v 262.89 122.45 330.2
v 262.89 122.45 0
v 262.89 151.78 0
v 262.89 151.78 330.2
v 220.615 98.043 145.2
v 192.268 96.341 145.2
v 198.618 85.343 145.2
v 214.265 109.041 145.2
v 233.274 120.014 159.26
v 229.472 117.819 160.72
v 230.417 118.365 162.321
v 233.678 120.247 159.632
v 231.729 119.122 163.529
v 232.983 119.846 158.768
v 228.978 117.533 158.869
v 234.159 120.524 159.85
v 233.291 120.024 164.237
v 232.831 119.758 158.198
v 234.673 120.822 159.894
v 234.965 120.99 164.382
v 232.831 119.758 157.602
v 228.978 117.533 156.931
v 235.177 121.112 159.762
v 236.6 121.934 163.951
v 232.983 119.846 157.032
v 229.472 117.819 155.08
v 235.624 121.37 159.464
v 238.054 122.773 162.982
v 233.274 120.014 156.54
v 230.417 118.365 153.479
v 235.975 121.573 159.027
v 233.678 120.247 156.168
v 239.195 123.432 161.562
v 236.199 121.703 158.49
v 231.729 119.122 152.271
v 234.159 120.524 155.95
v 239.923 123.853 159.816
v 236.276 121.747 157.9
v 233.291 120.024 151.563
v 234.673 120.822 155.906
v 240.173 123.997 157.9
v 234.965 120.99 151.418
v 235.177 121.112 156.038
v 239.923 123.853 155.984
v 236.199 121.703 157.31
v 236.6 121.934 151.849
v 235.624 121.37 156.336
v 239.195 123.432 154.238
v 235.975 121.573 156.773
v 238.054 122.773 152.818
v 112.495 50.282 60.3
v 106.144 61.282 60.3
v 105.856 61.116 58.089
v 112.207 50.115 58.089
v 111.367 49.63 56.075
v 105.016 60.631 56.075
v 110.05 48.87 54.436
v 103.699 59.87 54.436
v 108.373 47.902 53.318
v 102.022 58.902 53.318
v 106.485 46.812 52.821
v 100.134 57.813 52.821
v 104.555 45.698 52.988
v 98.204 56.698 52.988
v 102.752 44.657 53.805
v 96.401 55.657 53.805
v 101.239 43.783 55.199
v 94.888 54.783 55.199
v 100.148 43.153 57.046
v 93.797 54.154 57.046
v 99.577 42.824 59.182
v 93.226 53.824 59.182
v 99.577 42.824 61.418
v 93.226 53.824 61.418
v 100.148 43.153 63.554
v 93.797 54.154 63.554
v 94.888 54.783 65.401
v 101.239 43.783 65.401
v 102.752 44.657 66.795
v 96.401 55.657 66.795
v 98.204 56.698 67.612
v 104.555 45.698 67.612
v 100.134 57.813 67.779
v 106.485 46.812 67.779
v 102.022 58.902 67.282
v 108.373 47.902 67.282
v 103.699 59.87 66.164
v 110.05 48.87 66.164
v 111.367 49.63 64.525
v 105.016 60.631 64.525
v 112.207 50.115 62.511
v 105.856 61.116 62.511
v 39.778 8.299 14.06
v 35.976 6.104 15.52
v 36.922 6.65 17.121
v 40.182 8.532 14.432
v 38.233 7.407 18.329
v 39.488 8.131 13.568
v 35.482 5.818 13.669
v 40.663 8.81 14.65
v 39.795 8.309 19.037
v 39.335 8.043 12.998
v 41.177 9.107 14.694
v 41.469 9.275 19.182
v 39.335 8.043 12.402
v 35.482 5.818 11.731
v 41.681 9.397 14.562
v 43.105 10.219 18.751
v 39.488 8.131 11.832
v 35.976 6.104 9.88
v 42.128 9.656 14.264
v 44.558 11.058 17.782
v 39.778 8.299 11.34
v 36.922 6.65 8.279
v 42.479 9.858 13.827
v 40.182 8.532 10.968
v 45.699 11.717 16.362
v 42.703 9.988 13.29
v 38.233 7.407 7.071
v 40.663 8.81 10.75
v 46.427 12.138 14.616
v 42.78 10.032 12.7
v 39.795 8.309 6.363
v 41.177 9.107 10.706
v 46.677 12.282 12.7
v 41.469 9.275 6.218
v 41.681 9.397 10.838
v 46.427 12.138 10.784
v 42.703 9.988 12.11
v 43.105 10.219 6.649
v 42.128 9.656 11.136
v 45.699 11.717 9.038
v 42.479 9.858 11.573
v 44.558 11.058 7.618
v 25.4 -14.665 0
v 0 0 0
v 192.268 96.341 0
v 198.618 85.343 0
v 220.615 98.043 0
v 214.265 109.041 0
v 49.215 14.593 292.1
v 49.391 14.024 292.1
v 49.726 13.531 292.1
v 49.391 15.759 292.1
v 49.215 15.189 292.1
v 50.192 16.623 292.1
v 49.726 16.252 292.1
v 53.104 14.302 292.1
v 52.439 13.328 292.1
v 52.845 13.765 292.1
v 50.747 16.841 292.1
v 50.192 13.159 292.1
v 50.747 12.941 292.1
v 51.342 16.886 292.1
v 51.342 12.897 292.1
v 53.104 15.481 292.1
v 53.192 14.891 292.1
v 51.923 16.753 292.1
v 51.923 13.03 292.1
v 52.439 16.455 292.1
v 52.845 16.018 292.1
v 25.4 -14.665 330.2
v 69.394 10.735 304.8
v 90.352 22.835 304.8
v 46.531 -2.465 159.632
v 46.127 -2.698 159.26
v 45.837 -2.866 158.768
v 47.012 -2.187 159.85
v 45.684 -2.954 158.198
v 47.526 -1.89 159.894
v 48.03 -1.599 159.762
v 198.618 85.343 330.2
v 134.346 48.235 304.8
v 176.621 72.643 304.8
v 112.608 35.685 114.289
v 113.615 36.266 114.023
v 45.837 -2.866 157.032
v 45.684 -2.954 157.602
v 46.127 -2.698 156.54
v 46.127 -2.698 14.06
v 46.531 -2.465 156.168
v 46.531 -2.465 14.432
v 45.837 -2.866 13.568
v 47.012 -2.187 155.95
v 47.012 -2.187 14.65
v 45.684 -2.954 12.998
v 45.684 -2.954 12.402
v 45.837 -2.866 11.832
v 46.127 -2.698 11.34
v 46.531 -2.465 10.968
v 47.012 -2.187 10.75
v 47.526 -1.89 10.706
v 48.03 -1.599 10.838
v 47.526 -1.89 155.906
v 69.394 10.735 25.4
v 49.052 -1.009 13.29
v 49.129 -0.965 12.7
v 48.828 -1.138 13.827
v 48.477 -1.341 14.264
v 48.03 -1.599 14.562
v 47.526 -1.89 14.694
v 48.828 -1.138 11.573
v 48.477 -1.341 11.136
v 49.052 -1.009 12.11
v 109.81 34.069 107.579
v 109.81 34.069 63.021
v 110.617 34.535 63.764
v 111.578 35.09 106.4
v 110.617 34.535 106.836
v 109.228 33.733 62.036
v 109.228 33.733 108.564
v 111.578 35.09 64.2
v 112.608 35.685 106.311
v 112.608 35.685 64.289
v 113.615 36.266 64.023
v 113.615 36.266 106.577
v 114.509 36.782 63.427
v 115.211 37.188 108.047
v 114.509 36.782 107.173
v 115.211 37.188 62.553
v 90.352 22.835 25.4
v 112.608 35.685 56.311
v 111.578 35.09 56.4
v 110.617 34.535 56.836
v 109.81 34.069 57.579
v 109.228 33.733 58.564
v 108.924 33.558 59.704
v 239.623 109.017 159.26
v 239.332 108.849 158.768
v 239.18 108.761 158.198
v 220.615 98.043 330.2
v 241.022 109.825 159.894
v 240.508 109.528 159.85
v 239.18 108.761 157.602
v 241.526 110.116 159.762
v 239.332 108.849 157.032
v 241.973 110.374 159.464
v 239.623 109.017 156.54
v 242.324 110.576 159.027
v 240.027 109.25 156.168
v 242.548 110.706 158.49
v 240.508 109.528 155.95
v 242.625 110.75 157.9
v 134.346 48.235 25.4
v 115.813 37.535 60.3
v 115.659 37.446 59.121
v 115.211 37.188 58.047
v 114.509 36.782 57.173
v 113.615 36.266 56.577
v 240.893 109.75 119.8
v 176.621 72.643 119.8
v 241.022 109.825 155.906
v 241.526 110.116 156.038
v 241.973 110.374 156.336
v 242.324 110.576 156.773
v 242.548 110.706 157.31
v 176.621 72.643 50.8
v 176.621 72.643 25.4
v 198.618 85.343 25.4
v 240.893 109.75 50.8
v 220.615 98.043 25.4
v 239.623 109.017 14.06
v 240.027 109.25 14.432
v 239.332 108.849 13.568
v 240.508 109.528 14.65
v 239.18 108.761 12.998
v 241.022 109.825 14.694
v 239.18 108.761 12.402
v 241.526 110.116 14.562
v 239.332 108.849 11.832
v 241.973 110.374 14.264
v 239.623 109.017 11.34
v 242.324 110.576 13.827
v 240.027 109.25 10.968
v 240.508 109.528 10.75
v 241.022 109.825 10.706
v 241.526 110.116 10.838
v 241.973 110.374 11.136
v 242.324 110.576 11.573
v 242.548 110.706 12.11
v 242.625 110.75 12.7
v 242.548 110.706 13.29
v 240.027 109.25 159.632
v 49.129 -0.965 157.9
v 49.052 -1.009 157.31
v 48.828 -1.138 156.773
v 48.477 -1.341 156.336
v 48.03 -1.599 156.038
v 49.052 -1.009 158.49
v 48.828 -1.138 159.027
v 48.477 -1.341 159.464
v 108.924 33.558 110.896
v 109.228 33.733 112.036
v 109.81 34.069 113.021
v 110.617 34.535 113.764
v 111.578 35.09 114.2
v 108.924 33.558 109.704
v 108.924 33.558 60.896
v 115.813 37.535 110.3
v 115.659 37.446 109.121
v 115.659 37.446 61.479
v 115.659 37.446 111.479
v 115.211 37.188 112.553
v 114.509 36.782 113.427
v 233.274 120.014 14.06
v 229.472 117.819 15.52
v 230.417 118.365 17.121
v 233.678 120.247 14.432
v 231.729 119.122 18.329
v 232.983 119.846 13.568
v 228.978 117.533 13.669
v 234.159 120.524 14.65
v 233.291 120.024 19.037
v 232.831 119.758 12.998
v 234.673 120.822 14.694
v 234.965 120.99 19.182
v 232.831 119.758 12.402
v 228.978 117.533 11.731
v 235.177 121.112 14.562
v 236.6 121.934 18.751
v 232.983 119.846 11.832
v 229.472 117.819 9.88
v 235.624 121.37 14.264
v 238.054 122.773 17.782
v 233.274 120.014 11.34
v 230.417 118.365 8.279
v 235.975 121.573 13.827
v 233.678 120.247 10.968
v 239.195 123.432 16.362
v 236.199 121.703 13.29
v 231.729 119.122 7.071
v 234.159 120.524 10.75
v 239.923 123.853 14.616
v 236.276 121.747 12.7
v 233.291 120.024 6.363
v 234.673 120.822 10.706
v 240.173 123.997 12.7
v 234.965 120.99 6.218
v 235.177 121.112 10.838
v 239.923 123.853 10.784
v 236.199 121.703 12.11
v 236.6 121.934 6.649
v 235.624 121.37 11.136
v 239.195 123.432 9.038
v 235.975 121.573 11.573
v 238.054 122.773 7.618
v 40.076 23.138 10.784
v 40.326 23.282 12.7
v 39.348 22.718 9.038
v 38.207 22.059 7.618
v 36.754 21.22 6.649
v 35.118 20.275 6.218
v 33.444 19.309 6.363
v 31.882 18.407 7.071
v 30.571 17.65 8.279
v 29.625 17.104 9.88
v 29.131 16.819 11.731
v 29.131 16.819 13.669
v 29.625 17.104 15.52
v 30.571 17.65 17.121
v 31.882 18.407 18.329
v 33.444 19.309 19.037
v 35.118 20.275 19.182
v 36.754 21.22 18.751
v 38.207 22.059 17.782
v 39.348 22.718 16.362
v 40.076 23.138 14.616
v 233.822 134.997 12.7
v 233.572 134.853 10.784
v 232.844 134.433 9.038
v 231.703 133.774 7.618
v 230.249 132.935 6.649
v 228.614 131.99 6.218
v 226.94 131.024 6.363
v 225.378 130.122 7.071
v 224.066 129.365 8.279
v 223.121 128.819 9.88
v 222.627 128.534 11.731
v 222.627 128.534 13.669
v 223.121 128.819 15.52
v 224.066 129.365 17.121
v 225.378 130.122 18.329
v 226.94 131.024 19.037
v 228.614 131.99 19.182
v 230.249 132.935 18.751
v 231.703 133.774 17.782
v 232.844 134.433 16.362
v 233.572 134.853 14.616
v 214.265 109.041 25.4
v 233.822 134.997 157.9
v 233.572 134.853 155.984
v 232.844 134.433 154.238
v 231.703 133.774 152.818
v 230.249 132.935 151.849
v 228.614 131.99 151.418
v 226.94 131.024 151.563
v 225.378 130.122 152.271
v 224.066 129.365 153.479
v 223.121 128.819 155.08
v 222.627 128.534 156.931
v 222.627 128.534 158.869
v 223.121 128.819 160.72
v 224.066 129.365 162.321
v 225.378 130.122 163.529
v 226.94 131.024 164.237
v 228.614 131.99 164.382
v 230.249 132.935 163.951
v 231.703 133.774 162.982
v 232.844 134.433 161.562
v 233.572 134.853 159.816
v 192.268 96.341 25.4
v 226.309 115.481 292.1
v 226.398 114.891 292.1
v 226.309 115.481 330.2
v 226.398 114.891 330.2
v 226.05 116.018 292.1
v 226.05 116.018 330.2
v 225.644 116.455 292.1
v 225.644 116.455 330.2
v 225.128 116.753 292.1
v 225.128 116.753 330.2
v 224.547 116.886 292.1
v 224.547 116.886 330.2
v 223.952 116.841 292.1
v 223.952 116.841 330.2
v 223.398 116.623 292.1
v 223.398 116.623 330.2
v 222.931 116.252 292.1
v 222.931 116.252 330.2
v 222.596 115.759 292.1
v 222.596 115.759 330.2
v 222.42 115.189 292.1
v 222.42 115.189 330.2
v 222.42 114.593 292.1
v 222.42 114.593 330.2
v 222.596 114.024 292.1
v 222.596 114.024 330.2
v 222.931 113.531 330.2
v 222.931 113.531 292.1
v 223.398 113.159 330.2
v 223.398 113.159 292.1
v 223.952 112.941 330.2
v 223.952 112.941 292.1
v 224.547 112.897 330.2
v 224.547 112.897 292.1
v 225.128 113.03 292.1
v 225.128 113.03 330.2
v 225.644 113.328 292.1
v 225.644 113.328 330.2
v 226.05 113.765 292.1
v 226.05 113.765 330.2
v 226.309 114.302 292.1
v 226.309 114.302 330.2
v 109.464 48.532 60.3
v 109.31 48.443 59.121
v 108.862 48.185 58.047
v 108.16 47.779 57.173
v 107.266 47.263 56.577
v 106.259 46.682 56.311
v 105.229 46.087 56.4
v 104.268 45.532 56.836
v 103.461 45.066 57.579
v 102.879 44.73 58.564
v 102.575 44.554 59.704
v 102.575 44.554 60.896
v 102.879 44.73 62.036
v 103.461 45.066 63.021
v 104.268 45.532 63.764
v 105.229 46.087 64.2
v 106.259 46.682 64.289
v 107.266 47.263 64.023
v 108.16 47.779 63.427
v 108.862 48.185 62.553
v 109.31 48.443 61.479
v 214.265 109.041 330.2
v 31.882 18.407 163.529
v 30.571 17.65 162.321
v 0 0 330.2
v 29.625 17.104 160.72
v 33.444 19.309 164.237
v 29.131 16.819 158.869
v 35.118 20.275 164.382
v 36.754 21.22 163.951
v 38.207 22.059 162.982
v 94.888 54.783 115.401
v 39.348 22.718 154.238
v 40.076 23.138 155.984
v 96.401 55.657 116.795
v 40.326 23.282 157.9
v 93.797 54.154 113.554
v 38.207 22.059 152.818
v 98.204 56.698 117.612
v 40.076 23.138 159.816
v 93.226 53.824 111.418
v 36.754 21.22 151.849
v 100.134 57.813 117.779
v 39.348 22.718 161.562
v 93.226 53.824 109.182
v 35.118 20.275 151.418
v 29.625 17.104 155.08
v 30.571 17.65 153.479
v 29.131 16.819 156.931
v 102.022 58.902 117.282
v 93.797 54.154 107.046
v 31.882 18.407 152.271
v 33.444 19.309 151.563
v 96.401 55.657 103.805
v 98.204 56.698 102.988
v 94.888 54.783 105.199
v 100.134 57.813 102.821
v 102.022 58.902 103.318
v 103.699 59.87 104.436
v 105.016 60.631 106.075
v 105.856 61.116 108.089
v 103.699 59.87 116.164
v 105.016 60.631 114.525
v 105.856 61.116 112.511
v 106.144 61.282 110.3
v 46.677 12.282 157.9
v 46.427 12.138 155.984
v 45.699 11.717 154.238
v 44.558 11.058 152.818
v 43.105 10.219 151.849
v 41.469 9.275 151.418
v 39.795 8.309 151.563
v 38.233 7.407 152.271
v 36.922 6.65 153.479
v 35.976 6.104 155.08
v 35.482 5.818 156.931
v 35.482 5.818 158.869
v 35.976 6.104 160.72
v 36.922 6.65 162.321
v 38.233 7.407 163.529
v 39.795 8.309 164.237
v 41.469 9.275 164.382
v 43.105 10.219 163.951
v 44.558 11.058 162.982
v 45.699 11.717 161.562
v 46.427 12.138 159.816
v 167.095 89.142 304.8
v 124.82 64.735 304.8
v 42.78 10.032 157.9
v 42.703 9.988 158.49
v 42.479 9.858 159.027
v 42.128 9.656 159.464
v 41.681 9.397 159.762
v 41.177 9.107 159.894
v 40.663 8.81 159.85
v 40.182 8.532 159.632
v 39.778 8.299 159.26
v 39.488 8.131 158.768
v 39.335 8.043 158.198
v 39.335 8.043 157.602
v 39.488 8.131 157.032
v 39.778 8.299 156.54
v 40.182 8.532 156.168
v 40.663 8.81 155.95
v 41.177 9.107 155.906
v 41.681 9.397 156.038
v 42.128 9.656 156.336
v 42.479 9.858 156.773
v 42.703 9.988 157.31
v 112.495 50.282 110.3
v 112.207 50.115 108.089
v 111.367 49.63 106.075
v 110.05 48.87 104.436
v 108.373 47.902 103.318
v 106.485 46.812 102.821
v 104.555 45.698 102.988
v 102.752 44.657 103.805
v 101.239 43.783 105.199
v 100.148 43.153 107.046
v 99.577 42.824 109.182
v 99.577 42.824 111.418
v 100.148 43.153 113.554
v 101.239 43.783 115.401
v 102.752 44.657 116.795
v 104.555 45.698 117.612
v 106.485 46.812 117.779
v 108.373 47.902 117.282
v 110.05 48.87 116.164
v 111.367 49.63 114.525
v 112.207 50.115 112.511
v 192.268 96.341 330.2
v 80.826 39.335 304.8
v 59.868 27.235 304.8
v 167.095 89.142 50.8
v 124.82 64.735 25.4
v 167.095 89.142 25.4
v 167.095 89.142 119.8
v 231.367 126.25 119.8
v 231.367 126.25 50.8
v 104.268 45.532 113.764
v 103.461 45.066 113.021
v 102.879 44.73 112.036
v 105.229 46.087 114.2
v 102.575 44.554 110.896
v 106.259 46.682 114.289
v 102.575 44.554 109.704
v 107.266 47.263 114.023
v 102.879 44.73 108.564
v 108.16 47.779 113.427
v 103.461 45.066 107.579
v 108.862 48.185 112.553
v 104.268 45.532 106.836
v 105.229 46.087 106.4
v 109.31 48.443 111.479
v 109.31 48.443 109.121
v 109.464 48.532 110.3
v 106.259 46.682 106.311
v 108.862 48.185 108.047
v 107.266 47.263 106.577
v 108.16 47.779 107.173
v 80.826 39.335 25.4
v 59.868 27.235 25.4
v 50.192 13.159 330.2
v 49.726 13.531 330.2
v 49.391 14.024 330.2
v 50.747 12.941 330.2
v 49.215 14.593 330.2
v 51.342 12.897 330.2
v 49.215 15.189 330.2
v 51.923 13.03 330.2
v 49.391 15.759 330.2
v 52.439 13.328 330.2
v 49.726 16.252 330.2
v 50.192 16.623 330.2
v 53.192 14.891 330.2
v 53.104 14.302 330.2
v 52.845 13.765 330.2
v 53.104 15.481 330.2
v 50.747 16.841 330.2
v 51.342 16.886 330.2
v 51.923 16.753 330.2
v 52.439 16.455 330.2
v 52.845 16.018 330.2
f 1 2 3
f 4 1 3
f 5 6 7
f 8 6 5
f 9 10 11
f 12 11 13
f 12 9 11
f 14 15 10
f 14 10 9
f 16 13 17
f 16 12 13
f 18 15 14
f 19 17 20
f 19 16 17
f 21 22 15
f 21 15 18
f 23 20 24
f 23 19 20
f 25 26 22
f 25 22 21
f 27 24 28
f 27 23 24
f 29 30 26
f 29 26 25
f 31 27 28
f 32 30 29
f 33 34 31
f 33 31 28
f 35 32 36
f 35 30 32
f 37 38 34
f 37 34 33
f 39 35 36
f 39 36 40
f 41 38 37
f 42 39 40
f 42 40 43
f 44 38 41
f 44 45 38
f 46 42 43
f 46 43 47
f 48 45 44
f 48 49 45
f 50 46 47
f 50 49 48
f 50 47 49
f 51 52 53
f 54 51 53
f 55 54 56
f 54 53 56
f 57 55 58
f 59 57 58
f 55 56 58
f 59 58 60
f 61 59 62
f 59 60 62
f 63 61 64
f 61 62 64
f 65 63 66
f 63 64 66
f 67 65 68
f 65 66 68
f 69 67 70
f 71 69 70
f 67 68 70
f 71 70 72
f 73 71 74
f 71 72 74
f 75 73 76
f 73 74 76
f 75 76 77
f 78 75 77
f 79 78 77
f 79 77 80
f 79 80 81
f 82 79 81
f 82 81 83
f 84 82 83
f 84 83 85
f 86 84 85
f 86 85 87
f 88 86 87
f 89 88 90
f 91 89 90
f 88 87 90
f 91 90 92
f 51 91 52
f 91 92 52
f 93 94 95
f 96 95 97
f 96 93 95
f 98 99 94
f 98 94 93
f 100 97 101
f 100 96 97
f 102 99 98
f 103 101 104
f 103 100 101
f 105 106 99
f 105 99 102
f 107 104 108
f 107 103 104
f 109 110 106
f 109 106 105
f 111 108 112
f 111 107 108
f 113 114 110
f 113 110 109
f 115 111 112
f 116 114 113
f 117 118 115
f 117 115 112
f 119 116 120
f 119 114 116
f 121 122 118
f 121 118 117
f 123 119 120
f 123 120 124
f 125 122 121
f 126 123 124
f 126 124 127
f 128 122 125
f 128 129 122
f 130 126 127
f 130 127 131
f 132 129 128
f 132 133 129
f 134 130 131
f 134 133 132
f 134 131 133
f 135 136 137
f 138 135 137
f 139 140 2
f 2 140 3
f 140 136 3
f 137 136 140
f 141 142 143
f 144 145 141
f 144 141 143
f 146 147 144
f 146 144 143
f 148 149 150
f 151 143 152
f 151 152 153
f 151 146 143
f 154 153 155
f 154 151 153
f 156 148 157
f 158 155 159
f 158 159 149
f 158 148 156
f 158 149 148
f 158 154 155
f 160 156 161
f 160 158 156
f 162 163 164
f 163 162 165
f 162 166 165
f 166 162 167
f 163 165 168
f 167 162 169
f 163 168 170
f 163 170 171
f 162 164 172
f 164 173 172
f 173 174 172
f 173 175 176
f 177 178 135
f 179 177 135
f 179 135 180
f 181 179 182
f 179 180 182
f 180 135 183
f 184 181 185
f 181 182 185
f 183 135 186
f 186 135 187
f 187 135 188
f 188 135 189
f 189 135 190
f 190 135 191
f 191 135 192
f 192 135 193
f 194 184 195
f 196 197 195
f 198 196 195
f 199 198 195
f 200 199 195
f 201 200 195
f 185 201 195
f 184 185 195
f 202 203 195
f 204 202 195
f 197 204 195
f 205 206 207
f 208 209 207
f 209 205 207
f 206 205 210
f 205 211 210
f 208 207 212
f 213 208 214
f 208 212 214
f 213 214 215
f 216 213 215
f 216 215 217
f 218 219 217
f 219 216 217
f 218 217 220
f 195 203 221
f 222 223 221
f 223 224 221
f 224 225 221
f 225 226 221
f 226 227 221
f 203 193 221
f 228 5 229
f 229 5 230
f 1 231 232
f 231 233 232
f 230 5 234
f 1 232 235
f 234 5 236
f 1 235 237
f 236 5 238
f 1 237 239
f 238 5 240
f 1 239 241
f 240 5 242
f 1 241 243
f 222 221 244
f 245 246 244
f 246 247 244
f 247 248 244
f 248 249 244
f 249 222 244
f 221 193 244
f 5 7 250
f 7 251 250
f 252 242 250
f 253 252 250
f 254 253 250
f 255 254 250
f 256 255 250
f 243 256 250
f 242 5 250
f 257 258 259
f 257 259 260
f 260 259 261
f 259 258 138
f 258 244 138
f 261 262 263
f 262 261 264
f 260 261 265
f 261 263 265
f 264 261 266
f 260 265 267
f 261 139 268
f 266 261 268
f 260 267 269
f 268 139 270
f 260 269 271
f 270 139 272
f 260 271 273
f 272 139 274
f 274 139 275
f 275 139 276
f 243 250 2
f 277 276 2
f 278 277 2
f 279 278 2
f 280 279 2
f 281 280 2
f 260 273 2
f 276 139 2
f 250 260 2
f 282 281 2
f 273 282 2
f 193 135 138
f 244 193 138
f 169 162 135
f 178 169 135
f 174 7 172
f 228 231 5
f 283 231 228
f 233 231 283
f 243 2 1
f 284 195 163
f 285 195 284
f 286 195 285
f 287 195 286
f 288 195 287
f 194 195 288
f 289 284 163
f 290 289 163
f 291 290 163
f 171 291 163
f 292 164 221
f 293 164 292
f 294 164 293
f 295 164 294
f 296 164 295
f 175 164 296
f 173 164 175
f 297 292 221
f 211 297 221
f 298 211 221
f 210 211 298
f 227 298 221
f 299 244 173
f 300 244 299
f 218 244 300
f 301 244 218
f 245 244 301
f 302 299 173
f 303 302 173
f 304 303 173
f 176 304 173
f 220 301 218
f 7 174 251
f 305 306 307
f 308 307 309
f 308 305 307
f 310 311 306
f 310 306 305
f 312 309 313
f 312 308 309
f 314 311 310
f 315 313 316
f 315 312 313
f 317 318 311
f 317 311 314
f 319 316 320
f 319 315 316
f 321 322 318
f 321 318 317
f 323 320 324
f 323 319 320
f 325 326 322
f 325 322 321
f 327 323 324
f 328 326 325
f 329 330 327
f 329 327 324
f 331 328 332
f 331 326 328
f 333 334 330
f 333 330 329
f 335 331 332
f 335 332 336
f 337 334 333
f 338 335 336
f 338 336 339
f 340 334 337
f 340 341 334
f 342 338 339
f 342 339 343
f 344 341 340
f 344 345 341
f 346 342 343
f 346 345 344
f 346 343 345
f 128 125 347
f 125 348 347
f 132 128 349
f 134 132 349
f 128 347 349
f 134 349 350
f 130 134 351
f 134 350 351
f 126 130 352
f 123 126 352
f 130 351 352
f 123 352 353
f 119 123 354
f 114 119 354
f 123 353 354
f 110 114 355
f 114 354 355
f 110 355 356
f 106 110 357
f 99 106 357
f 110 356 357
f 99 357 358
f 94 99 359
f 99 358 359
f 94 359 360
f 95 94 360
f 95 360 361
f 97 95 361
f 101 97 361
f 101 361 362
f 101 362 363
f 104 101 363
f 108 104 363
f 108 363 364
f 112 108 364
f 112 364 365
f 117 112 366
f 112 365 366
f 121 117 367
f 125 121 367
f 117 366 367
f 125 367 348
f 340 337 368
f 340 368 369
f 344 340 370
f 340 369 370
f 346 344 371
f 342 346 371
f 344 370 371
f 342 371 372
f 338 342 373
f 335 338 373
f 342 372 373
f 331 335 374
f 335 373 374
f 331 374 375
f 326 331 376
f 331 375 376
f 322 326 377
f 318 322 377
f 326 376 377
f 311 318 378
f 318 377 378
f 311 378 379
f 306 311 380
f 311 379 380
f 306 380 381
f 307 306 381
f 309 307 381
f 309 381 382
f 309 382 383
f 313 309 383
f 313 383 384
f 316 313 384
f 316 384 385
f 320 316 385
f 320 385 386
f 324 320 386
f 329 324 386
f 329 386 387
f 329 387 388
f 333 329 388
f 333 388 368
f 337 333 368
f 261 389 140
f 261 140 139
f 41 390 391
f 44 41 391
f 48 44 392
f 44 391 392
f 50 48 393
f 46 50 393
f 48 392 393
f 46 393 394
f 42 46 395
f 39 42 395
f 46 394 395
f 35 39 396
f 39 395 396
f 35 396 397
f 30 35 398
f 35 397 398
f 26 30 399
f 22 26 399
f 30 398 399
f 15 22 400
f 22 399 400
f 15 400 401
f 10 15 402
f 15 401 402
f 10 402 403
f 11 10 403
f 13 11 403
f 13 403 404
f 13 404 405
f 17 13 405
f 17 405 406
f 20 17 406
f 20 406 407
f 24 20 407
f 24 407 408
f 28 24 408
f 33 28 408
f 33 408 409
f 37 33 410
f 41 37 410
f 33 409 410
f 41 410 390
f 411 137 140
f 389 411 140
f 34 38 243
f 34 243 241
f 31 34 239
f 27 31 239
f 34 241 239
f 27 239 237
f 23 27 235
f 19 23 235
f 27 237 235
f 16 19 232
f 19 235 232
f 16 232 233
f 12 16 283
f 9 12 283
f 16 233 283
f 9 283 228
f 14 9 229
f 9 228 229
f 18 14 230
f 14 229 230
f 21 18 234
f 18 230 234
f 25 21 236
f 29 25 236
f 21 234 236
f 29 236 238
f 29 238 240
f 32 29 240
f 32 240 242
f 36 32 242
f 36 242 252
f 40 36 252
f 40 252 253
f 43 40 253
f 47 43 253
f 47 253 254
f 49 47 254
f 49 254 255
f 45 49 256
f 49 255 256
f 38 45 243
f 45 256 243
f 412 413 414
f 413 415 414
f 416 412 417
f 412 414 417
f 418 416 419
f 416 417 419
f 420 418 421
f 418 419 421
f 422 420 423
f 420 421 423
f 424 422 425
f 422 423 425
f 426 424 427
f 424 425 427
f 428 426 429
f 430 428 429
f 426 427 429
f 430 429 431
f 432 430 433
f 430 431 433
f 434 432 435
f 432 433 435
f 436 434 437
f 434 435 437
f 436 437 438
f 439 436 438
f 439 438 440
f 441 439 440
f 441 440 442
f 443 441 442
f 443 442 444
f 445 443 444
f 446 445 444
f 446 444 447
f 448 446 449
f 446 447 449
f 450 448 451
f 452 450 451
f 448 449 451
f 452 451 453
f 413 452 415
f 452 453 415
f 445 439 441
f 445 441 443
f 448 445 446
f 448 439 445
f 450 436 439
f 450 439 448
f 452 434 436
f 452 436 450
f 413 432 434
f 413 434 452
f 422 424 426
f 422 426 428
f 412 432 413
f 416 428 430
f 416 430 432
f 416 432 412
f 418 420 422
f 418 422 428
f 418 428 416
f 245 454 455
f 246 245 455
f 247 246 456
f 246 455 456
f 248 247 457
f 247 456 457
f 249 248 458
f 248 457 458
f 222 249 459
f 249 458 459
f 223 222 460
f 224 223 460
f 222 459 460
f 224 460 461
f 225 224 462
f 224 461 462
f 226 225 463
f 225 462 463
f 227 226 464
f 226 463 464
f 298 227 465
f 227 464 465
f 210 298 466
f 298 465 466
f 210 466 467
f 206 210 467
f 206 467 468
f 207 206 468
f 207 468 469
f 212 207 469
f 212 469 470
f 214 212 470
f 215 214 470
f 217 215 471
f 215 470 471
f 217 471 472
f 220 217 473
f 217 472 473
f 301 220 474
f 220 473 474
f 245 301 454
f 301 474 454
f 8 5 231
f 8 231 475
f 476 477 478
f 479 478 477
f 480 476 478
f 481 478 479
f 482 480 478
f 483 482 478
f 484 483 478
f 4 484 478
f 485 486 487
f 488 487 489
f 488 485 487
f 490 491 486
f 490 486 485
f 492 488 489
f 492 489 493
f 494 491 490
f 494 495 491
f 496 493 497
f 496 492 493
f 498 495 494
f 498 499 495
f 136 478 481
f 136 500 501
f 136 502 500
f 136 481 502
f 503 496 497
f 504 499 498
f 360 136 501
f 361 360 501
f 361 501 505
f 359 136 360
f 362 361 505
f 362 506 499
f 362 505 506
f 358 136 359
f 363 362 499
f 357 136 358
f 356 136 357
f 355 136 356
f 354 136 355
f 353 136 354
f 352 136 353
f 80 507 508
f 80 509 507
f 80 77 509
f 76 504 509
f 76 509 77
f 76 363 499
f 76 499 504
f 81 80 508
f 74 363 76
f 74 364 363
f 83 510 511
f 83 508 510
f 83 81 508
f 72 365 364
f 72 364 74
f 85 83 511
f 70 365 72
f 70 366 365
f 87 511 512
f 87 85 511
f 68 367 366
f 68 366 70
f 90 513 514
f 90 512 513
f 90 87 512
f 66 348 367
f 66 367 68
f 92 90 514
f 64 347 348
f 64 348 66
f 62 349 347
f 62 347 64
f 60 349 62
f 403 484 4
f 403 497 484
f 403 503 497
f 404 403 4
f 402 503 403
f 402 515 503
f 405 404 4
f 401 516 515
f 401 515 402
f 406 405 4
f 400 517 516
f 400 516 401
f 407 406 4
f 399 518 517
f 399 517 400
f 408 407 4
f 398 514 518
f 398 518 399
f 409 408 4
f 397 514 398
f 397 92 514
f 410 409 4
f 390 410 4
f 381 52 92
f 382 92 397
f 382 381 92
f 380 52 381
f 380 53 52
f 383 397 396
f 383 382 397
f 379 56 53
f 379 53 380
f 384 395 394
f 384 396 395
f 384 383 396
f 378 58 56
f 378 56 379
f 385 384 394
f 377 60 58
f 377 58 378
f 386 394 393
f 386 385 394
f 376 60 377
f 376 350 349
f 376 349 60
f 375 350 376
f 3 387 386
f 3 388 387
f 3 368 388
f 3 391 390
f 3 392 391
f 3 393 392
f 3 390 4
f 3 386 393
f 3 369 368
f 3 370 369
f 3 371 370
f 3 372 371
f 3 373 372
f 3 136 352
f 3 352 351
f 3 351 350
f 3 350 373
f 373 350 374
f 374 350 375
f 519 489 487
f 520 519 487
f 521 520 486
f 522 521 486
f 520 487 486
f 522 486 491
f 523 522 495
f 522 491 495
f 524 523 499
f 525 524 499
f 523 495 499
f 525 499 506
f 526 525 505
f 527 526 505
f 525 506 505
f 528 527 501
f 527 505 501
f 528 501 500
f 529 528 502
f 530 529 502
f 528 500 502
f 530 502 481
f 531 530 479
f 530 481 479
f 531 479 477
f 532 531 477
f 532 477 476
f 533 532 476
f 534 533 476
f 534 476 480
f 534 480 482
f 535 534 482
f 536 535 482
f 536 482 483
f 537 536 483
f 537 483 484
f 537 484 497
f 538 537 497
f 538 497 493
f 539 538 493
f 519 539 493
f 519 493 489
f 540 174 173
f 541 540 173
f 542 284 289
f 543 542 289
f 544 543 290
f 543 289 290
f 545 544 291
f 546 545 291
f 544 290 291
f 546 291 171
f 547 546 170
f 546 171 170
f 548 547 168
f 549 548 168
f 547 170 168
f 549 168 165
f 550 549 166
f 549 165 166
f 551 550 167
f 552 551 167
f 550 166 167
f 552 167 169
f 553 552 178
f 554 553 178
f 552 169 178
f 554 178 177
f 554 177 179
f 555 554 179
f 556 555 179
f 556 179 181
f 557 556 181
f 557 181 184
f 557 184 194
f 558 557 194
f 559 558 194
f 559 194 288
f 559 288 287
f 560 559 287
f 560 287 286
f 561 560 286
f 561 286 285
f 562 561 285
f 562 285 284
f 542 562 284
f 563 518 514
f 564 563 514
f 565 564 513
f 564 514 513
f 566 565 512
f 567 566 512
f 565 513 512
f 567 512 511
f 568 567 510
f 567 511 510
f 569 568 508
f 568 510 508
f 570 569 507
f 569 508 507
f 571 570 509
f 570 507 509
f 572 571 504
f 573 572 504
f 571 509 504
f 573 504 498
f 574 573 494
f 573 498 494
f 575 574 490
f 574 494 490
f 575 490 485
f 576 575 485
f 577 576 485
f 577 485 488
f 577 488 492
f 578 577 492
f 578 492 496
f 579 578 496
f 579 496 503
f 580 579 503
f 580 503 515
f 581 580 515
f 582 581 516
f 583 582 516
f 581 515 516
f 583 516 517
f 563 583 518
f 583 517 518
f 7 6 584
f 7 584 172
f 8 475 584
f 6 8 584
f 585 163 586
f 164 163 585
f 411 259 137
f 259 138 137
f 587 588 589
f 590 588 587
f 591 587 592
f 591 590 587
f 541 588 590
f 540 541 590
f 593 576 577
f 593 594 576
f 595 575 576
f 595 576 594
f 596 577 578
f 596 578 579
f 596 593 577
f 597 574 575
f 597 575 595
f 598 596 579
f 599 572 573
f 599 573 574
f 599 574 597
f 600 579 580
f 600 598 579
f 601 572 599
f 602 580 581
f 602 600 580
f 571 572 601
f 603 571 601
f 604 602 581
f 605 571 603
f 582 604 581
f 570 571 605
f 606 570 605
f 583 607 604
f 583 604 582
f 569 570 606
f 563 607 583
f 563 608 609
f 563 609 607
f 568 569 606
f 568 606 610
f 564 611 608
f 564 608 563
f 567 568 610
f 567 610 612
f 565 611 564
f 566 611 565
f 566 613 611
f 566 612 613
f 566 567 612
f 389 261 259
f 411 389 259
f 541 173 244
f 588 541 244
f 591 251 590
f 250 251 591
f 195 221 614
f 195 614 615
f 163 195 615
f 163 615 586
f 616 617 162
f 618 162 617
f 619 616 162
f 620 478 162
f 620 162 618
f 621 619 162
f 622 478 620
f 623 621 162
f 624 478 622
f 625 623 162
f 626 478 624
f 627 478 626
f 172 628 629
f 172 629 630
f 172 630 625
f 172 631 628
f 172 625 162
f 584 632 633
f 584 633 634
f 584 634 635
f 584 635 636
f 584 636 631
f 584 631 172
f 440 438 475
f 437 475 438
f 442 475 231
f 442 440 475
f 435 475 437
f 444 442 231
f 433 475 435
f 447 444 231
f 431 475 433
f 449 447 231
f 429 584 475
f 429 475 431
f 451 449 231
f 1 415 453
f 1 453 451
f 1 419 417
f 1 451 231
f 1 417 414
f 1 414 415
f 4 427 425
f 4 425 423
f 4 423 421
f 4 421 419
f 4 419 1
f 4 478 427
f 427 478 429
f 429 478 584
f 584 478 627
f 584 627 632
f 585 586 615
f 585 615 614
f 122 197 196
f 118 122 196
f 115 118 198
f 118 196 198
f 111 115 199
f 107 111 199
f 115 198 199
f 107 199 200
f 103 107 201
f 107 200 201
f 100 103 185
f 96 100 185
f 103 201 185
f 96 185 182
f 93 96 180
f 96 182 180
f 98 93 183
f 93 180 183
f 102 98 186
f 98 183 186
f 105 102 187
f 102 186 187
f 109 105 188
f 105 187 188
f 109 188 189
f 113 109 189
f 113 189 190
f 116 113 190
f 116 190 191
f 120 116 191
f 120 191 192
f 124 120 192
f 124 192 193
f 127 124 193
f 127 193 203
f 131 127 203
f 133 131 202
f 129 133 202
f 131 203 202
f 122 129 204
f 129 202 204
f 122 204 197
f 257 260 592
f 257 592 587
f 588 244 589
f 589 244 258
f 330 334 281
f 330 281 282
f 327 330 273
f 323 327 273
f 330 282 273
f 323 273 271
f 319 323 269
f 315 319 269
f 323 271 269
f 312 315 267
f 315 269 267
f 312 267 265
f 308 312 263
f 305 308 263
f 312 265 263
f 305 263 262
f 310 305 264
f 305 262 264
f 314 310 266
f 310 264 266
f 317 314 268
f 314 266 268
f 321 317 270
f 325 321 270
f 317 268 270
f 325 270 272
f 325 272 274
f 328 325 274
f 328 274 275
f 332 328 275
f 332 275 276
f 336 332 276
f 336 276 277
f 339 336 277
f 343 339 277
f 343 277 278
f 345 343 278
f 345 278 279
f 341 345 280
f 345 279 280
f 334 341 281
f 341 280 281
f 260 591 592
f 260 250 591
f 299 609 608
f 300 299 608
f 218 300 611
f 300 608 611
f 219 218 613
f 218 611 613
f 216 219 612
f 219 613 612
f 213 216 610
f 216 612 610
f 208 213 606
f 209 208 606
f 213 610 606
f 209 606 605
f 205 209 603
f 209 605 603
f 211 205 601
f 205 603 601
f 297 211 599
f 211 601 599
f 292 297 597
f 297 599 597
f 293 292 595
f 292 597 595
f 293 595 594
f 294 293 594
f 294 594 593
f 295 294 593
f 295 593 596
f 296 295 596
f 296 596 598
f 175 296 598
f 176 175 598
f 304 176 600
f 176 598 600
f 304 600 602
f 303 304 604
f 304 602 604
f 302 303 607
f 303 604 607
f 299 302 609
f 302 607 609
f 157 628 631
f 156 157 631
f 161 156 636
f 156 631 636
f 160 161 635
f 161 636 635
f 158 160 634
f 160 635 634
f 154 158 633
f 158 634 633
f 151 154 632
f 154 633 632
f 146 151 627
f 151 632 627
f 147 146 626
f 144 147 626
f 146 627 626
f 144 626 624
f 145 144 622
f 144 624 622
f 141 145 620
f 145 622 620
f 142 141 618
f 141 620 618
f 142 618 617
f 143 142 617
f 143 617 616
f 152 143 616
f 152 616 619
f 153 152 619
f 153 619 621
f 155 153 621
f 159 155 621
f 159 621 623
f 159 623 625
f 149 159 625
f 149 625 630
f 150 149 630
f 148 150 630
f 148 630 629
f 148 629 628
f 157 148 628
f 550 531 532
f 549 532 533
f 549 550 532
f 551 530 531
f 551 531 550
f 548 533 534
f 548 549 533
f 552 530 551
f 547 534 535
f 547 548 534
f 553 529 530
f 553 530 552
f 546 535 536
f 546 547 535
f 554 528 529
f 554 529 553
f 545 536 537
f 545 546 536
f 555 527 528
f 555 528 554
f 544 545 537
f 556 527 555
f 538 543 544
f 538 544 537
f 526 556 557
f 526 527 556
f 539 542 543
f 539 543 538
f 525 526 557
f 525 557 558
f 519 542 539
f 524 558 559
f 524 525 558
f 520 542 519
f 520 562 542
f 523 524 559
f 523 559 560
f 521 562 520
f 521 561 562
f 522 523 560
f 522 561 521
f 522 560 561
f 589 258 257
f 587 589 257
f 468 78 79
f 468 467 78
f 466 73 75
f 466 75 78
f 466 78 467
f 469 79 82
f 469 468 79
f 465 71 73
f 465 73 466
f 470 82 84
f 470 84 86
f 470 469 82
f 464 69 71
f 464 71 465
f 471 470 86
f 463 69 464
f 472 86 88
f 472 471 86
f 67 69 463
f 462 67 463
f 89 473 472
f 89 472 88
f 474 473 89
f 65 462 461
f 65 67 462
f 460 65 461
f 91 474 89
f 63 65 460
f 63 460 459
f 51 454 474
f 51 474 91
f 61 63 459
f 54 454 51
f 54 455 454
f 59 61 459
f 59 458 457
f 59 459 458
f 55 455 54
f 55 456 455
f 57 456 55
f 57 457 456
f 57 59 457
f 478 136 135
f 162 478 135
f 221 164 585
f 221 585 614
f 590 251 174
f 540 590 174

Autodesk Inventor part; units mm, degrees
ref_plane "YZ Plane" through (0, 0, 0) normal (1, 0, 0) x (0, 1, 0)
ref_plane "XZ Plane" through (0, 0, 0) normal (0, 1, 0) x (-1, 0, 0)
ref_plane "XY Plane" through (0, 0, 0) normal (0, 0, 1) x (1, 0, 0)
sketch "Sketch1" plane through (0, 0, 0) normal (0, 0, 1) x (1, 0, 0)
  line L0 (262.89, 151.7796) -> (525.78, 0) construction
  line L1 (525.78, 0) -> (525.78, -303.5592) construction
  line L2 (525.78, -303.5592) -> (262.89, -455.3388) construction
  line L3 (262.89, -455.3388) -> (0, -303.5592) construction
  line L4 (0, -303.5592) -> (0, 0) construction
  line L5 (0, 0) -> (262.89, 151.7796)
  line L6 (0, 0) -> (25.4, -14.6647)
  line L7 (25.4, -14.6647) -> (262.89, 122.4502)
  line L8 (262.89, 122.4502) -> (262.89, 151.7796)
  point P0 (262.89, -151.7796)
  dimension "d0" = 525.78
  dimension "d2" = 25.4
  dimension "d3" = 60
  dimension "d4" = 60
extrude "Extrusion1" add sketch "Sketch1" along normal blind 330.2
sketch "Sketch8" plane through (0, 0, 0) normal (0, 0, -1) x (-1, 0, 0)
  line L0 (-25.4, -14.6647) -> (-262.89, 122.4502) projected
  line L1 (-198.618, 85.3428) -> (-192.268, 96.3413)
  line L2 (-192.268, 96.3413) -> (-214.265, 109.0413)
  line L3 (-214.265, 109.0413) -> (-220.615, 98.0428)
  line L4 (-198.618, 85.3428) -> (-220.615, 98.0428)
  point P0 (0, 0)
  dimension "d47" = 25.4
  dimension "d48" = 12.7
  dimension "d49" = 48.8149
extrude "Extrusion7" cut sketch "Sketch8" against normal blind 25.4
sketch "Sketch9" plane through (0, 0, 330.2) normal (0, 0, 1) x (1, 0, 0)
  line L0 (192.268, 96.3413) -> (198.618, 85.3428) projected
  line L1 (214.265, 109.0413) -> (192.268, 96.3413) projected
  line L2 (220.615, 98.0428) -> (214.265, 109.0413) projected
  line L3 (198.618, 85.3428) -> (220.615, 98.0428) projected
  point P0 (0, 0)
extrude "Extrusion8" cut sketch "Sketch9" against normal blind 185
sketch "Sketch10" plane through (25.4, -14.6647, 0) normal (0.5, -0.8660254, 0) x (0.8660254, 0.5, 0)
  line L0 (25.4, 157.9) -> (248.8298, 157.9) construction
  line L1 (248.8298, 157.9) -> (248.8298, 12.7) construction
  line L2 (248.8298, 12.7) -> (25.4, 12.7) construction
  line L3 (25.4, 12.7) -> (25.4, 157.9) construction
  line L4 (225.4149, 145.2) -> (200.0149, 145.2) construction
  line L5 (200.0149, 25.4) -> (225.4149, 25.4) construction
  line L6 (274.2298, 0) -> (274.2298, 330.2) construction
  line L7 (0, 0) -> (0, 330.2) construction
  circle A0 centre (25.4, 157.9) radius 2
  circle A1 centre (25.4, 12.7) radius 2
  circle A2 centre (248.8298, 157.9) radius 2
  circle A3 centre (248.8298, 12.7) radius 2
  point P0 (-14.6647, 0)
  dimension "d54" = 12.7
  dimension "d55" = 12.7
  dimension "d56" = 25.4
  dimension "d57" = 25.4
  dimension "d58" = 4
  dimension "d59" = 4
  dimension "d60" = 4
  dimension "d61" = 4
extrude "Extrusion9" cut sketch "Sketch10" against normal through all
sketch "Sketch11" plane through (0, 0, 330.2) normal (-0.5, 0.8660254, 0) x (0.8660254, 0.5, 0)
  circle A0 centre (263.4945, 172.3) radius 2 projected
  circle A1 centre (263.4945, 317.5) radius 2 projected
  circle A2 centre (40.0647, 317.5) radius 2 projected
  circle A3 centre (40.0647, 172.3) radius 2 projected
  circle A4 centre (263.4945, 172.3) radius 6.5
  circle A5 centre (40.0647, 172.3) radius 2 projected
  circle A6 centre (40.0647, 172.3) radius 6.5
  circle A7 centre (40.0647, 317.5) radius 6.5
  circle A8 centre (263.4945, 317.5) radius 2 projected
  circle A9 centre (263.4945, 317.5) radius 6.5
  point P0 (0, 330.2)
  dimension "d64" = 13
  dimension "d65" = 13
  dimension "d66" = 13
  dimension "d67" = 13
extrude "Extrusion10" cut sketch "Sketch11" against normal blind 12.7 contours A0 | A1 | A2 | A3 | A4 | A6 | A7 | A9
sketch "Sketch12" plane through (0, 0, 330.2) normal (-0.5, 0.8660254, 0) x (0.8660254, 0.5, 0)
  circle A0 centre (115.0647, 269.9) radius 4
  circle A1 centre (115.0647, 219.9) radius 4
  circle A2 centre (40.0647, 317.5) radius 6.5 construction
  circle A3 centre (40.0647, 172.3) radius 6.5 construction
  circle A4 centre (40.0647, 317.5) radius 2 projected
  circle A5 centre (40.0647, 172.3) radius 2 projected
  line L0 (40.0647, 317.5) -> (40.0647, 172.3) construction
  line L1 (115.0647, 269.9) -> (115.0647, 219.9) construction
  point P0 (0, 330.2)
  point P1 (40.0647, 244.9)
  point P2 (115.0647, 244.9)
  dimension "d70" = 8
  dimension "d71" = 8
  dimension "d72" = 75
  dimension "d73" = 50
extrude "Extrusion11" cut sketch "Sketch12" against normal through all contours A0 | A1
sketch "Sketch13" plane through (0, 0, 330.2) normal (-0.5, 0.8660254, 0) x (0.8660254, 0.5, 0)
  circle A0 centre (115.0647, 219.9) radius 4 projected
  circle A1 centre (115.0647, 269.9) radius 4 projected
  circle A2 centre (115.0647, 219.9) radius 7.5
  circle A3 centre (115.0647, 269.9) radius 7.5
  point P0 (0, 330.2)
  dimension "d76" = 15
  dimension "d77" = 15
extrude "Extrusion12" cut sketch "Sketch13" against normal blind 12.7 contours A0 | A1 | A2 | A3
sketch "Sketch14" plane through (25.4, -14.6647, 0) normal (0.5, -0.8660254, 0) x (0.8660254, 0.5, 0)
  line L0 (50.8, 304.8) -> (75, 304.8)
  line L1 (75, 304.8) -> (75, 25.4)
  line L2 (75, 25.4) -> (50.8, 25.4)
  line L3 (50.8, 25.4) -> (50.8, 304.8)
  line L4 (125.8, 25.4) -> (174.6149, 25.4)
  line L5 (174.6149, 25.4) -> (174.6149, 304.8)
  line L6 (174.6149, 304.8) -> (125.8, 304.8)
  line L7 (125.8, 304.8) -> (125.8, 25.4)
  line L8 (174.6149, 119.8) -> (248.8298, 119.8)
  line L9 (248.8298, 119.8) -> (248.8298, 50.8)
  line L10 (248.8298, 50.8) -> (174.6149, 50.8)
  line L11 (174.6149, 50.8) -> (174.6149, 119.8)
  line L12 (0, 330.2) -> (200.0149, 330.2) projected
  line L13 (0, 0) -> (200.0149, 0) projected
  line L14 (200.0149, 0) -> (200.0149, 25.4) projected
  circle A0 centre (100.4, 110.3) radius 4 projected
  circle A1 centre (25.4, 157.9) radius 2 projected
  line L15 (225.4149, 145.2) -> (200.0149, 145.2) projected
  line L16 (200.0149, 25.4) -> (225.4149, 25.4) projected
  line L17 (274.2298, 0) -> (274.2298, 330.2) projected
  point P0 (-14.6647, 0)
  dimension "d80" = 25.4
  dimension "d81" = 25.4
  dimension "d82" = 25.4
  dimension "d83" = 25.4
  dimension "d84" = 25.4
  dimension "d85" = 25.4
  dimension "d86" = 25.4
  dimension "d87" = 25.4
  dimension "d88" = 25.4
extrude "Extrusion13" cut sketch "Sketch14" against normal blind 19.05 contours L0 L1 L2 L3 | L7 L6 L5 L4 | L5 L8 L9 L10
sketch "Sketch15" plane through (0, 0, 330.2) normal (0, 0, 1) x (1, 0, 0)
  line L0 (12.7, -7.3323) -> (262.89, 137.1149) construction
  line L1 (0, 0) -> (25.4, -14.6647) projected
  line L2 (262.89, 122.4502) -> (262.89, 151.7796) projected
  line L3 (51.1925, 14.8913) -> (224.3975, 114.8913)
  circle A0 centre (51.1925, 14.8913) radius 2
  circle A1 centre (224.3975, 114.8913) radius 2
  point P0 (137.795, 64.8913)
  dimension "d91" = 200
  dimension "d92" = 4
  dimension "d93" = 4
extrude "Extrusion14" cut sketch "Sketch15" against normal blind 38.1
properties part number "HB02" material "Polyethylene, High Density"
